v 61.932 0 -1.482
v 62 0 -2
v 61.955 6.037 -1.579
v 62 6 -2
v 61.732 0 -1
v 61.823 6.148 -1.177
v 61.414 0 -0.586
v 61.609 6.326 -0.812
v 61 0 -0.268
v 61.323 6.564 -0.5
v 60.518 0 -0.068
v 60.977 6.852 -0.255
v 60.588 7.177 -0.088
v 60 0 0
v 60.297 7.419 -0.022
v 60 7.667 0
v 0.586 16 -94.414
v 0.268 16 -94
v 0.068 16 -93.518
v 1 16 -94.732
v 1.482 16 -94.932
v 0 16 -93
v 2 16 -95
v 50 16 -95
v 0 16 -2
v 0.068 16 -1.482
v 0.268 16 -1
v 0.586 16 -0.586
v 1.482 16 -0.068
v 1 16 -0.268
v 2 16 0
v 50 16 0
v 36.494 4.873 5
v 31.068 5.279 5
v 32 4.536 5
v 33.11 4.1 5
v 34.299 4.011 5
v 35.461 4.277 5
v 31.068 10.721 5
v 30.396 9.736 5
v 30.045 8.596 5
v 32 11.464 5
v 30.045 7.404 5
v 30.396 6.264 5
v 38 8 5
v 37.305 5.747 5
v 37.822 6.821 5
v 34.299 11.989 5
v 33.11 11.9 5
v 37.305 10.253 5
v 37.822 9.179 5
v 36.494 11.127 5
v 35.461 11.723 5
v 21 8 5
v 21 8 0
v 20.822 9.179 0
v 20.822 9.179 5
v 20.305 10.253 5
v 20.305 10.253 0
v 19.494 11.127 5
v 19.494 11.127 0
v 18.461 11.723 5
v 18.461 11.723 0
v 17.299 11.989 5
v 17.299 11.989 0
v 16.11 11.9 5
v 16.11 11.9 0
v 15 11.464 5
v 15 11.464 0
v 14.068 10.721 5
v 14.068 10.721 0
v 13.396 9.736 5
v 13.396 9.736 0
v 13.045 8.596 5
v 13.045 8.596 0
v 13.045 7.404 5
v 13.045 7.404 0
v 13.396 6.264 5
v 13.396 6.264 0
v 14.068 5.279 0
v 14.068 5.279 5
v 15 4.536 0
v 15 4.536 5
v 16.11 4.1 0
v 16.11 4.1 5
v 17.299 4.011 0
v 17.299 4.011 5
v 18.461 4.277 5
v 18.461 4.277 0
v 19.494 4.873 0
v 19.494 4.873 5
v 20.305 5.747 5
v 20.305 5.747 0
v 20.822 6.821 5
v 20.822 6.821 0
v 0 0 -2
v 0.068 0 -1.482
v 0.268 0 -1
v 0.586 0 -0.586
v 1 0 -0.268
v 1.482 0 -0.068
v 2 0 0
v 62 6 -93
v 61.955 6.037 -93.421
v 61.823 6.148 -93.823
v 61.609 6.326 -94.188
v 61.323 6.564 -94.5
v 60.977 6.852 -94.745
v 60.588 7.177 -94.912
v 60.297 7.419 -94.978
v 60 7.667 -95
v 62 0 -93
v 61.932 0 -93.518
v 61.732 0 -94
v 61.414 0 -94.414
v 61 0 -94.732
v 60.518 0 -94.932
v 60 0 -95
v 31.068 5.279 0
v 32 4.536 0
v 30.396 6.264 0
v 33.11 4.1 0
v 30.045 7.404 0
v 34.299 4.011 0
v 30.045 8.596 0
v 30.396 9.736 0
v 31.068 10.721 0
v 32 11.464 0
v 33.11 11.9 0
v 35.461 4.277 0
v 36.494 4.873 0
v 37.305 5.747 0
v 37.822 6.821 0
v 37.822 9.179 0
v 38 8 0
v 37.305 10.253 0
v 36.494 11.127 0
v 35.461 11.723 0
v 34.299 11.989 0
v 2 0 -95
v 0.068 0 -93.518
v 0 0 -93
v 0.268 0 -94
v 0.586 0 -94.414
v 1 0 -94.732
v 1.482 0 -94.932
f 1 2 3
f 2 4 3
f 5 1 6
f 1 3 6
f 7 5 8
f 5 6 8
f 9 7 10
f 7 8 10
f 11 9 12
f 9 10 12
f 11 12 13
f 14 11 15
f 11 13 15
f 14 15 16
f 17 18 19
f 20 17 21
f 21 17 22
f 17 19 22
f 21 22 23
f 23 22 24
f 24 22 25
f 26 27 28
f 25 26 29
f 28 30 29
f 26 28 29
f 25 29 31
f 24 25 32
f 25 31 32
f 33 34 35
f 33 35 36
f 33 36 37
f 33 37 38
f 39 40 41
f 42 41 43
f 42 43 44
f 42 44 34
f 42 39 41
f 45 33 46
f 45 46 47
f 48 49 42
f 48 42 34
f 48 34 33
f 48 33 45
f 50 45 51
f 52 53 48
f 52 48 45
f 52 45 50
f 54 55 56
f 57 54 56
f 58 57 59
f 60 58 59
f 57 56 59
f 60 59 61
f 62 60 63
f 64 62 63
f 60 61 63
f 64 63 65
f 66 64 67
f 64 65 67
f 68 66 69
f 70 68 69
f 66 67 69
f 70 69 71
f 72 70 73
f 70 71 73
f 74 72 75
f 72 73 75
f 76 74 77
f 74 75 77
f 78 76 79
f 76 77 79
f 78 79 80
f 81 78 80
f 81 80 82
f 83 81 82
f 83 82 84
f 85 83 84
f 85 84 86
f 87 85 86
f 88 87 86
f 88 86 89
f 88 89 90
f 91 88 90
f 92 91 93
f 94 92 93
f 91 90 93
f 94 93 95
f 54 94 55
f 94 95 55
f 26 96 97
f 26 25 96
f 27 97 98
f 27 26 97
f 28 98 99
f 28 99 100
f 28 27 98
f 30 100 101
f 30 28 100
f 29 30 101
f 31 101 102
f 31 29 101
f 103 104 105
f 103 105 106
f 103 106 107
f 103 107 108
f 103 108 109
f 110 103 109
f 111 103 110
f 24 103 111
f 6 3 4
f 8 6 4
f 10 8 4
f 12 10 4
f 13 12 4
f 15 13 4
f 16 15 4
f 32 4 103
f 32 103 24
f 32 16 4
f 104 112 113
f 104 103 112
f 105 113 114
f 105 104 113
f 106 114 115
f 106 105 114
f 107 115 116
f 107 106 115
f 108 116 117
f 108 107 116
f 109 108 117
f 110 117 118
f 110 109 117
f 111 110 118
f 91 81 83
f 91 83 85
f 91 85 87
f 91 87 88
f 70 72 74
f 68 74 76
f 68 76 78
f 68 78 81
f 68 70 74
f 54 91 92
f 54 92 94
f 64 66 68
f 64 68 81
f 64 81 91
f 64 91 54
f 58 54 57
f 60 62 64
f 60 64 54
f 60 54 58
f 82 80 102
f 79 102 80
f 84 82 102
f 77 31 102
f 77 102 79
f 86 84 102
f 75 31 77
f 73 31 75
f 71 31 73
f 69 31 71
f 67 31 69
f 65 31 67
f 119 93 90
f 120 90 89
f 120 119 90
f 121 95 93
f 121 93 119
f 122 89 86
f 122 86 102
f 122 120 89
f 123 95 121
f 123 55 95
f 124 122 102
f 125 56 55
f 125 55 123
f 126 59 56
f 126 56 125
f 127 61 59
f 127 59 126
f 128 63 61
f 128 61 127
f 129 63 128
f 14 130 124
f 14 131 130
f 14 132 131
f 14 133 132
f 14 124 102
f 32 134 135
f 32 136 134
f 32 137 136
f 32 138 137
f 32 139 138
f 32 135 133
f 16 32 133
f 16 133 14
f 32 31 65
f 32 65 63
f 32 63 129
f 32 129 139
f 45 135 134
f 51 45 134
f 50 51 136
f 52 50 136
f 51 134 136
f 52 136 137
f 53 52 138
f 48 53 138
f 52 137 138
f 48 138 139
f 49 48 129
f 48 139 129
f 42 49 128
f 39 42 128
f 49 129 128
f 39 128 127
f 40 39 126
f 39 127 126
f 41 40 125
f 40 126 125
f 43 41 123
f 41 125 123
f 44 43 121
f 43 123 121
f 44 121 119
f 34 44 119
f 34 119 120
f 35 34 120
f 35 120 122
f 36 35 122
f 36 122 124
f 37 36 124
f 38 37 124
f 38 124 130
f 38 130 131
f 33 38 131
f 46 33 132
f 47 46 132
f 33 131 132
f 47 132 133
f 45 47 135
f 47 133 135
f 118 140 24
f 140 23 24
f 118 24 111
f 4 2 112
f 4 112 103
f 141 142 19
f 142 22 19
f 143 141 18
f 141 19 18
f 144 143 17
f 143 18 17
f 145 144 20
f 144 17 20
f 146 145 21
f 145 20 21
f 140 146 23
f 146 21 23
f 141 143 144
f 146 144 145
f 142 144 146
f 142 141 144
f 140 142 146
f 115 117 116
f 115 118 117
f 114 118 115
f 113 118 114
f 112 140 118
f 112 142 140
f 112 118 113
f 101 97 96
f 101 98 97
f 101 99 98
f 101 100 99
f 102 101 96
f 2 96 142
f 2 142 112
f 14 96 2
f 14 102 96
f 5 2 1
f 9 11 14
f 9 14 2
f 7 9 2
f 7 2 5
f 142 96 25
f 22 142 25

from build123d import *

# Parameters (mm, degrees)
SKETCH_1_W      = 50
SKETCH_1_H      = 16
EXTRUDE_1_DEPTH = 95
FILLET_1_R      = 2
SKETCH_2_R      = 4
EXTRUDE_2_DEPTH = 5


with BuildPart() as part:
    # 草图1 → 凸台-拉伸1 (new body)
    with BuildSketch(Plane.XY):
        with Locations((25, 8)):
            Rectangle(SKETCH_1_W, SKETCH_1_H)
        Polygon((62, 0), (62, 6), (50, 16), (50, 0), align=None)
    extrude(amount=-EXTRUDE_1_DEPTH)

    # 圆角1
    fillet_1_edges = [part.edges().sort_by_distance(p)[0] for p in [
        (62, 3, -95),
        (0, 8, -95),
        (0, 8, 0),
        (62, 3, 0),
    ]]
    fillet(fillet_1_edges, radius=FILLET_1_R)

    # 草图2 → 凸台-拉伸2 (add)
    with BuildSketch(Plane.XY):
        with Locations((17, 8)):
            Circle(SKETCH_2_R)
        with Locations((34, 8)):
            Circle(SKETCH_2_R)
    extrude(amount=EXTRUDE_2_DEPTH)


solid = part.part
